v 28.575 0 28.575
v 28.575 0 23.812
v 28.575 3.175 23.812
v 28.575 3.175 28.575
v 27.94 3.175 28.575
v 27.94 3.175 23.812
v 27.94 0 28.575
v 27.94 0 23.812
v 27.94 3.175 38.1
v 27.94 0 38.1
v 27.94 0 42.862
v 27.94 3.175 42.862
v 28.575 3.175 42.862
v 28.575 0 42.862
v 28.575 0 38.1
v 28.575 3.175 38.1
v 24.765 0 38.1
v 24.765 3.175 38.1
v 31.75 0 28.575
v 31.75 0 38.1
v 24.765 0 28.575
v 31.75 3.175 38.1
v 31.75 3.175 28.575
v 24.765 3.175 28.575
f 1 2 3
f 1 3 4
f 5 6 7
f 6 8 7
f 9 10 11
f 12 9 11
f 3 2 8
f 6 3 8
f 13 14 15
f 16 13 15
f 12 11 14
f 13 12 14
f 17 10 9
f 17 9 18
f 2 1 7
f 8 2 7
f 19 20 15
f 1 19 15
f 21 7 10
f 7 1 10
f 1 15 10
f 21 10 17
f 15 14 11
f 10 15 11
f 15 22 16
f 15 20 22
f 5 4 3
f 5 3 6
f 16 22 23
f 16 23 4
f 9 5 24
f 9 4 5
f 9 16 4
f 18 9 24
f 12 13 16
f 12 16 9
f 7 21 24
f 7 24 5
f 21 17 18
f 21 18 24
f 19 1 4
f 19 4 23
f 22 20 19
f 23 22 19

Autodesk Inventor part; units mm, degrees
ref_plane "YZ Plane" through (0, 0, 0) normal (1, 0, 0) x (0, 1, 0)
ref_plane "XZ Plane" through (0, 0, 0) normal (0, 1, 0) x (-1, 0, 0)
ref_plane "XY Plane" through (0, 0, 0) normal (0, 0, 1) x (1, 0, 0)
sketch "Sketch1" plane through (0, 0, 0) normal (0, 1, 0) x (-1, 0, 0)
  line L0 (-27.94, 42.8625) -> (-31.75, 42.8625)
  line L1 (-31.75, 42.8625) -> (-31.75, 23.8125)
  line L2 (-31.75, 23.8125) -> (-27.94, 23.8125)
  line L3 (-27.94, 23.8125) -> (-27.94, 42.8625)
  line L4 (-27.94, 38.1) -> (-24.765, 38.1)
  line L5 (-24.765, 38.1) -> (-24.765, 28.575)
  line L6 (-24.765, 28.575) -> (-27.94, 28.575)
  line L7 (-27.94, 28.575) -> (-27.94, 38.1)
  line L8 (-31.75, 38.1) -> (-28.575, 38.1)
  line L9 (-28.575, 28.575) -> (-31.75, 28.575)
  line L10 (-31.75, 28.575) -> (-31.75, 38.1)
  line L11 (-28.575, 28.575) -> (-31.75, 28.575)
  line L12 (-31.75, 28.575) -> (-31.75, 23.8125)
  line L13 (-31.75, 23.8125) -> (-28.575, 23.8125)
  line L14 (-28.575, 23.8125) -> (-28.575, 28.575)
  line L15 (-28.575, 38.1) -> (-31.75, 38.1)
  line L16 (-31.75, 38.1) -> (-31.75, 42.8625)
  line L17 (-31.75, 42.8625) -> (-28.575, 42.8625)
  line L18 (-28.575, 42.8625) -> (-28.575, 38.1)
  point P0 (0, 0)
  dimension "d0" = 4.7625
  dimension "d1" = 4.7625
  dimension "d2" = 19.05
  dimension "d3" = 3.175
  dimension "d4" = 3.81
extrude "Extrusion2" add sketch "Sketch1" along normal blind 3.175 contours L3 L2 L14 L9 L1 L8 L18 L0 | L4 L5 L6 L3
